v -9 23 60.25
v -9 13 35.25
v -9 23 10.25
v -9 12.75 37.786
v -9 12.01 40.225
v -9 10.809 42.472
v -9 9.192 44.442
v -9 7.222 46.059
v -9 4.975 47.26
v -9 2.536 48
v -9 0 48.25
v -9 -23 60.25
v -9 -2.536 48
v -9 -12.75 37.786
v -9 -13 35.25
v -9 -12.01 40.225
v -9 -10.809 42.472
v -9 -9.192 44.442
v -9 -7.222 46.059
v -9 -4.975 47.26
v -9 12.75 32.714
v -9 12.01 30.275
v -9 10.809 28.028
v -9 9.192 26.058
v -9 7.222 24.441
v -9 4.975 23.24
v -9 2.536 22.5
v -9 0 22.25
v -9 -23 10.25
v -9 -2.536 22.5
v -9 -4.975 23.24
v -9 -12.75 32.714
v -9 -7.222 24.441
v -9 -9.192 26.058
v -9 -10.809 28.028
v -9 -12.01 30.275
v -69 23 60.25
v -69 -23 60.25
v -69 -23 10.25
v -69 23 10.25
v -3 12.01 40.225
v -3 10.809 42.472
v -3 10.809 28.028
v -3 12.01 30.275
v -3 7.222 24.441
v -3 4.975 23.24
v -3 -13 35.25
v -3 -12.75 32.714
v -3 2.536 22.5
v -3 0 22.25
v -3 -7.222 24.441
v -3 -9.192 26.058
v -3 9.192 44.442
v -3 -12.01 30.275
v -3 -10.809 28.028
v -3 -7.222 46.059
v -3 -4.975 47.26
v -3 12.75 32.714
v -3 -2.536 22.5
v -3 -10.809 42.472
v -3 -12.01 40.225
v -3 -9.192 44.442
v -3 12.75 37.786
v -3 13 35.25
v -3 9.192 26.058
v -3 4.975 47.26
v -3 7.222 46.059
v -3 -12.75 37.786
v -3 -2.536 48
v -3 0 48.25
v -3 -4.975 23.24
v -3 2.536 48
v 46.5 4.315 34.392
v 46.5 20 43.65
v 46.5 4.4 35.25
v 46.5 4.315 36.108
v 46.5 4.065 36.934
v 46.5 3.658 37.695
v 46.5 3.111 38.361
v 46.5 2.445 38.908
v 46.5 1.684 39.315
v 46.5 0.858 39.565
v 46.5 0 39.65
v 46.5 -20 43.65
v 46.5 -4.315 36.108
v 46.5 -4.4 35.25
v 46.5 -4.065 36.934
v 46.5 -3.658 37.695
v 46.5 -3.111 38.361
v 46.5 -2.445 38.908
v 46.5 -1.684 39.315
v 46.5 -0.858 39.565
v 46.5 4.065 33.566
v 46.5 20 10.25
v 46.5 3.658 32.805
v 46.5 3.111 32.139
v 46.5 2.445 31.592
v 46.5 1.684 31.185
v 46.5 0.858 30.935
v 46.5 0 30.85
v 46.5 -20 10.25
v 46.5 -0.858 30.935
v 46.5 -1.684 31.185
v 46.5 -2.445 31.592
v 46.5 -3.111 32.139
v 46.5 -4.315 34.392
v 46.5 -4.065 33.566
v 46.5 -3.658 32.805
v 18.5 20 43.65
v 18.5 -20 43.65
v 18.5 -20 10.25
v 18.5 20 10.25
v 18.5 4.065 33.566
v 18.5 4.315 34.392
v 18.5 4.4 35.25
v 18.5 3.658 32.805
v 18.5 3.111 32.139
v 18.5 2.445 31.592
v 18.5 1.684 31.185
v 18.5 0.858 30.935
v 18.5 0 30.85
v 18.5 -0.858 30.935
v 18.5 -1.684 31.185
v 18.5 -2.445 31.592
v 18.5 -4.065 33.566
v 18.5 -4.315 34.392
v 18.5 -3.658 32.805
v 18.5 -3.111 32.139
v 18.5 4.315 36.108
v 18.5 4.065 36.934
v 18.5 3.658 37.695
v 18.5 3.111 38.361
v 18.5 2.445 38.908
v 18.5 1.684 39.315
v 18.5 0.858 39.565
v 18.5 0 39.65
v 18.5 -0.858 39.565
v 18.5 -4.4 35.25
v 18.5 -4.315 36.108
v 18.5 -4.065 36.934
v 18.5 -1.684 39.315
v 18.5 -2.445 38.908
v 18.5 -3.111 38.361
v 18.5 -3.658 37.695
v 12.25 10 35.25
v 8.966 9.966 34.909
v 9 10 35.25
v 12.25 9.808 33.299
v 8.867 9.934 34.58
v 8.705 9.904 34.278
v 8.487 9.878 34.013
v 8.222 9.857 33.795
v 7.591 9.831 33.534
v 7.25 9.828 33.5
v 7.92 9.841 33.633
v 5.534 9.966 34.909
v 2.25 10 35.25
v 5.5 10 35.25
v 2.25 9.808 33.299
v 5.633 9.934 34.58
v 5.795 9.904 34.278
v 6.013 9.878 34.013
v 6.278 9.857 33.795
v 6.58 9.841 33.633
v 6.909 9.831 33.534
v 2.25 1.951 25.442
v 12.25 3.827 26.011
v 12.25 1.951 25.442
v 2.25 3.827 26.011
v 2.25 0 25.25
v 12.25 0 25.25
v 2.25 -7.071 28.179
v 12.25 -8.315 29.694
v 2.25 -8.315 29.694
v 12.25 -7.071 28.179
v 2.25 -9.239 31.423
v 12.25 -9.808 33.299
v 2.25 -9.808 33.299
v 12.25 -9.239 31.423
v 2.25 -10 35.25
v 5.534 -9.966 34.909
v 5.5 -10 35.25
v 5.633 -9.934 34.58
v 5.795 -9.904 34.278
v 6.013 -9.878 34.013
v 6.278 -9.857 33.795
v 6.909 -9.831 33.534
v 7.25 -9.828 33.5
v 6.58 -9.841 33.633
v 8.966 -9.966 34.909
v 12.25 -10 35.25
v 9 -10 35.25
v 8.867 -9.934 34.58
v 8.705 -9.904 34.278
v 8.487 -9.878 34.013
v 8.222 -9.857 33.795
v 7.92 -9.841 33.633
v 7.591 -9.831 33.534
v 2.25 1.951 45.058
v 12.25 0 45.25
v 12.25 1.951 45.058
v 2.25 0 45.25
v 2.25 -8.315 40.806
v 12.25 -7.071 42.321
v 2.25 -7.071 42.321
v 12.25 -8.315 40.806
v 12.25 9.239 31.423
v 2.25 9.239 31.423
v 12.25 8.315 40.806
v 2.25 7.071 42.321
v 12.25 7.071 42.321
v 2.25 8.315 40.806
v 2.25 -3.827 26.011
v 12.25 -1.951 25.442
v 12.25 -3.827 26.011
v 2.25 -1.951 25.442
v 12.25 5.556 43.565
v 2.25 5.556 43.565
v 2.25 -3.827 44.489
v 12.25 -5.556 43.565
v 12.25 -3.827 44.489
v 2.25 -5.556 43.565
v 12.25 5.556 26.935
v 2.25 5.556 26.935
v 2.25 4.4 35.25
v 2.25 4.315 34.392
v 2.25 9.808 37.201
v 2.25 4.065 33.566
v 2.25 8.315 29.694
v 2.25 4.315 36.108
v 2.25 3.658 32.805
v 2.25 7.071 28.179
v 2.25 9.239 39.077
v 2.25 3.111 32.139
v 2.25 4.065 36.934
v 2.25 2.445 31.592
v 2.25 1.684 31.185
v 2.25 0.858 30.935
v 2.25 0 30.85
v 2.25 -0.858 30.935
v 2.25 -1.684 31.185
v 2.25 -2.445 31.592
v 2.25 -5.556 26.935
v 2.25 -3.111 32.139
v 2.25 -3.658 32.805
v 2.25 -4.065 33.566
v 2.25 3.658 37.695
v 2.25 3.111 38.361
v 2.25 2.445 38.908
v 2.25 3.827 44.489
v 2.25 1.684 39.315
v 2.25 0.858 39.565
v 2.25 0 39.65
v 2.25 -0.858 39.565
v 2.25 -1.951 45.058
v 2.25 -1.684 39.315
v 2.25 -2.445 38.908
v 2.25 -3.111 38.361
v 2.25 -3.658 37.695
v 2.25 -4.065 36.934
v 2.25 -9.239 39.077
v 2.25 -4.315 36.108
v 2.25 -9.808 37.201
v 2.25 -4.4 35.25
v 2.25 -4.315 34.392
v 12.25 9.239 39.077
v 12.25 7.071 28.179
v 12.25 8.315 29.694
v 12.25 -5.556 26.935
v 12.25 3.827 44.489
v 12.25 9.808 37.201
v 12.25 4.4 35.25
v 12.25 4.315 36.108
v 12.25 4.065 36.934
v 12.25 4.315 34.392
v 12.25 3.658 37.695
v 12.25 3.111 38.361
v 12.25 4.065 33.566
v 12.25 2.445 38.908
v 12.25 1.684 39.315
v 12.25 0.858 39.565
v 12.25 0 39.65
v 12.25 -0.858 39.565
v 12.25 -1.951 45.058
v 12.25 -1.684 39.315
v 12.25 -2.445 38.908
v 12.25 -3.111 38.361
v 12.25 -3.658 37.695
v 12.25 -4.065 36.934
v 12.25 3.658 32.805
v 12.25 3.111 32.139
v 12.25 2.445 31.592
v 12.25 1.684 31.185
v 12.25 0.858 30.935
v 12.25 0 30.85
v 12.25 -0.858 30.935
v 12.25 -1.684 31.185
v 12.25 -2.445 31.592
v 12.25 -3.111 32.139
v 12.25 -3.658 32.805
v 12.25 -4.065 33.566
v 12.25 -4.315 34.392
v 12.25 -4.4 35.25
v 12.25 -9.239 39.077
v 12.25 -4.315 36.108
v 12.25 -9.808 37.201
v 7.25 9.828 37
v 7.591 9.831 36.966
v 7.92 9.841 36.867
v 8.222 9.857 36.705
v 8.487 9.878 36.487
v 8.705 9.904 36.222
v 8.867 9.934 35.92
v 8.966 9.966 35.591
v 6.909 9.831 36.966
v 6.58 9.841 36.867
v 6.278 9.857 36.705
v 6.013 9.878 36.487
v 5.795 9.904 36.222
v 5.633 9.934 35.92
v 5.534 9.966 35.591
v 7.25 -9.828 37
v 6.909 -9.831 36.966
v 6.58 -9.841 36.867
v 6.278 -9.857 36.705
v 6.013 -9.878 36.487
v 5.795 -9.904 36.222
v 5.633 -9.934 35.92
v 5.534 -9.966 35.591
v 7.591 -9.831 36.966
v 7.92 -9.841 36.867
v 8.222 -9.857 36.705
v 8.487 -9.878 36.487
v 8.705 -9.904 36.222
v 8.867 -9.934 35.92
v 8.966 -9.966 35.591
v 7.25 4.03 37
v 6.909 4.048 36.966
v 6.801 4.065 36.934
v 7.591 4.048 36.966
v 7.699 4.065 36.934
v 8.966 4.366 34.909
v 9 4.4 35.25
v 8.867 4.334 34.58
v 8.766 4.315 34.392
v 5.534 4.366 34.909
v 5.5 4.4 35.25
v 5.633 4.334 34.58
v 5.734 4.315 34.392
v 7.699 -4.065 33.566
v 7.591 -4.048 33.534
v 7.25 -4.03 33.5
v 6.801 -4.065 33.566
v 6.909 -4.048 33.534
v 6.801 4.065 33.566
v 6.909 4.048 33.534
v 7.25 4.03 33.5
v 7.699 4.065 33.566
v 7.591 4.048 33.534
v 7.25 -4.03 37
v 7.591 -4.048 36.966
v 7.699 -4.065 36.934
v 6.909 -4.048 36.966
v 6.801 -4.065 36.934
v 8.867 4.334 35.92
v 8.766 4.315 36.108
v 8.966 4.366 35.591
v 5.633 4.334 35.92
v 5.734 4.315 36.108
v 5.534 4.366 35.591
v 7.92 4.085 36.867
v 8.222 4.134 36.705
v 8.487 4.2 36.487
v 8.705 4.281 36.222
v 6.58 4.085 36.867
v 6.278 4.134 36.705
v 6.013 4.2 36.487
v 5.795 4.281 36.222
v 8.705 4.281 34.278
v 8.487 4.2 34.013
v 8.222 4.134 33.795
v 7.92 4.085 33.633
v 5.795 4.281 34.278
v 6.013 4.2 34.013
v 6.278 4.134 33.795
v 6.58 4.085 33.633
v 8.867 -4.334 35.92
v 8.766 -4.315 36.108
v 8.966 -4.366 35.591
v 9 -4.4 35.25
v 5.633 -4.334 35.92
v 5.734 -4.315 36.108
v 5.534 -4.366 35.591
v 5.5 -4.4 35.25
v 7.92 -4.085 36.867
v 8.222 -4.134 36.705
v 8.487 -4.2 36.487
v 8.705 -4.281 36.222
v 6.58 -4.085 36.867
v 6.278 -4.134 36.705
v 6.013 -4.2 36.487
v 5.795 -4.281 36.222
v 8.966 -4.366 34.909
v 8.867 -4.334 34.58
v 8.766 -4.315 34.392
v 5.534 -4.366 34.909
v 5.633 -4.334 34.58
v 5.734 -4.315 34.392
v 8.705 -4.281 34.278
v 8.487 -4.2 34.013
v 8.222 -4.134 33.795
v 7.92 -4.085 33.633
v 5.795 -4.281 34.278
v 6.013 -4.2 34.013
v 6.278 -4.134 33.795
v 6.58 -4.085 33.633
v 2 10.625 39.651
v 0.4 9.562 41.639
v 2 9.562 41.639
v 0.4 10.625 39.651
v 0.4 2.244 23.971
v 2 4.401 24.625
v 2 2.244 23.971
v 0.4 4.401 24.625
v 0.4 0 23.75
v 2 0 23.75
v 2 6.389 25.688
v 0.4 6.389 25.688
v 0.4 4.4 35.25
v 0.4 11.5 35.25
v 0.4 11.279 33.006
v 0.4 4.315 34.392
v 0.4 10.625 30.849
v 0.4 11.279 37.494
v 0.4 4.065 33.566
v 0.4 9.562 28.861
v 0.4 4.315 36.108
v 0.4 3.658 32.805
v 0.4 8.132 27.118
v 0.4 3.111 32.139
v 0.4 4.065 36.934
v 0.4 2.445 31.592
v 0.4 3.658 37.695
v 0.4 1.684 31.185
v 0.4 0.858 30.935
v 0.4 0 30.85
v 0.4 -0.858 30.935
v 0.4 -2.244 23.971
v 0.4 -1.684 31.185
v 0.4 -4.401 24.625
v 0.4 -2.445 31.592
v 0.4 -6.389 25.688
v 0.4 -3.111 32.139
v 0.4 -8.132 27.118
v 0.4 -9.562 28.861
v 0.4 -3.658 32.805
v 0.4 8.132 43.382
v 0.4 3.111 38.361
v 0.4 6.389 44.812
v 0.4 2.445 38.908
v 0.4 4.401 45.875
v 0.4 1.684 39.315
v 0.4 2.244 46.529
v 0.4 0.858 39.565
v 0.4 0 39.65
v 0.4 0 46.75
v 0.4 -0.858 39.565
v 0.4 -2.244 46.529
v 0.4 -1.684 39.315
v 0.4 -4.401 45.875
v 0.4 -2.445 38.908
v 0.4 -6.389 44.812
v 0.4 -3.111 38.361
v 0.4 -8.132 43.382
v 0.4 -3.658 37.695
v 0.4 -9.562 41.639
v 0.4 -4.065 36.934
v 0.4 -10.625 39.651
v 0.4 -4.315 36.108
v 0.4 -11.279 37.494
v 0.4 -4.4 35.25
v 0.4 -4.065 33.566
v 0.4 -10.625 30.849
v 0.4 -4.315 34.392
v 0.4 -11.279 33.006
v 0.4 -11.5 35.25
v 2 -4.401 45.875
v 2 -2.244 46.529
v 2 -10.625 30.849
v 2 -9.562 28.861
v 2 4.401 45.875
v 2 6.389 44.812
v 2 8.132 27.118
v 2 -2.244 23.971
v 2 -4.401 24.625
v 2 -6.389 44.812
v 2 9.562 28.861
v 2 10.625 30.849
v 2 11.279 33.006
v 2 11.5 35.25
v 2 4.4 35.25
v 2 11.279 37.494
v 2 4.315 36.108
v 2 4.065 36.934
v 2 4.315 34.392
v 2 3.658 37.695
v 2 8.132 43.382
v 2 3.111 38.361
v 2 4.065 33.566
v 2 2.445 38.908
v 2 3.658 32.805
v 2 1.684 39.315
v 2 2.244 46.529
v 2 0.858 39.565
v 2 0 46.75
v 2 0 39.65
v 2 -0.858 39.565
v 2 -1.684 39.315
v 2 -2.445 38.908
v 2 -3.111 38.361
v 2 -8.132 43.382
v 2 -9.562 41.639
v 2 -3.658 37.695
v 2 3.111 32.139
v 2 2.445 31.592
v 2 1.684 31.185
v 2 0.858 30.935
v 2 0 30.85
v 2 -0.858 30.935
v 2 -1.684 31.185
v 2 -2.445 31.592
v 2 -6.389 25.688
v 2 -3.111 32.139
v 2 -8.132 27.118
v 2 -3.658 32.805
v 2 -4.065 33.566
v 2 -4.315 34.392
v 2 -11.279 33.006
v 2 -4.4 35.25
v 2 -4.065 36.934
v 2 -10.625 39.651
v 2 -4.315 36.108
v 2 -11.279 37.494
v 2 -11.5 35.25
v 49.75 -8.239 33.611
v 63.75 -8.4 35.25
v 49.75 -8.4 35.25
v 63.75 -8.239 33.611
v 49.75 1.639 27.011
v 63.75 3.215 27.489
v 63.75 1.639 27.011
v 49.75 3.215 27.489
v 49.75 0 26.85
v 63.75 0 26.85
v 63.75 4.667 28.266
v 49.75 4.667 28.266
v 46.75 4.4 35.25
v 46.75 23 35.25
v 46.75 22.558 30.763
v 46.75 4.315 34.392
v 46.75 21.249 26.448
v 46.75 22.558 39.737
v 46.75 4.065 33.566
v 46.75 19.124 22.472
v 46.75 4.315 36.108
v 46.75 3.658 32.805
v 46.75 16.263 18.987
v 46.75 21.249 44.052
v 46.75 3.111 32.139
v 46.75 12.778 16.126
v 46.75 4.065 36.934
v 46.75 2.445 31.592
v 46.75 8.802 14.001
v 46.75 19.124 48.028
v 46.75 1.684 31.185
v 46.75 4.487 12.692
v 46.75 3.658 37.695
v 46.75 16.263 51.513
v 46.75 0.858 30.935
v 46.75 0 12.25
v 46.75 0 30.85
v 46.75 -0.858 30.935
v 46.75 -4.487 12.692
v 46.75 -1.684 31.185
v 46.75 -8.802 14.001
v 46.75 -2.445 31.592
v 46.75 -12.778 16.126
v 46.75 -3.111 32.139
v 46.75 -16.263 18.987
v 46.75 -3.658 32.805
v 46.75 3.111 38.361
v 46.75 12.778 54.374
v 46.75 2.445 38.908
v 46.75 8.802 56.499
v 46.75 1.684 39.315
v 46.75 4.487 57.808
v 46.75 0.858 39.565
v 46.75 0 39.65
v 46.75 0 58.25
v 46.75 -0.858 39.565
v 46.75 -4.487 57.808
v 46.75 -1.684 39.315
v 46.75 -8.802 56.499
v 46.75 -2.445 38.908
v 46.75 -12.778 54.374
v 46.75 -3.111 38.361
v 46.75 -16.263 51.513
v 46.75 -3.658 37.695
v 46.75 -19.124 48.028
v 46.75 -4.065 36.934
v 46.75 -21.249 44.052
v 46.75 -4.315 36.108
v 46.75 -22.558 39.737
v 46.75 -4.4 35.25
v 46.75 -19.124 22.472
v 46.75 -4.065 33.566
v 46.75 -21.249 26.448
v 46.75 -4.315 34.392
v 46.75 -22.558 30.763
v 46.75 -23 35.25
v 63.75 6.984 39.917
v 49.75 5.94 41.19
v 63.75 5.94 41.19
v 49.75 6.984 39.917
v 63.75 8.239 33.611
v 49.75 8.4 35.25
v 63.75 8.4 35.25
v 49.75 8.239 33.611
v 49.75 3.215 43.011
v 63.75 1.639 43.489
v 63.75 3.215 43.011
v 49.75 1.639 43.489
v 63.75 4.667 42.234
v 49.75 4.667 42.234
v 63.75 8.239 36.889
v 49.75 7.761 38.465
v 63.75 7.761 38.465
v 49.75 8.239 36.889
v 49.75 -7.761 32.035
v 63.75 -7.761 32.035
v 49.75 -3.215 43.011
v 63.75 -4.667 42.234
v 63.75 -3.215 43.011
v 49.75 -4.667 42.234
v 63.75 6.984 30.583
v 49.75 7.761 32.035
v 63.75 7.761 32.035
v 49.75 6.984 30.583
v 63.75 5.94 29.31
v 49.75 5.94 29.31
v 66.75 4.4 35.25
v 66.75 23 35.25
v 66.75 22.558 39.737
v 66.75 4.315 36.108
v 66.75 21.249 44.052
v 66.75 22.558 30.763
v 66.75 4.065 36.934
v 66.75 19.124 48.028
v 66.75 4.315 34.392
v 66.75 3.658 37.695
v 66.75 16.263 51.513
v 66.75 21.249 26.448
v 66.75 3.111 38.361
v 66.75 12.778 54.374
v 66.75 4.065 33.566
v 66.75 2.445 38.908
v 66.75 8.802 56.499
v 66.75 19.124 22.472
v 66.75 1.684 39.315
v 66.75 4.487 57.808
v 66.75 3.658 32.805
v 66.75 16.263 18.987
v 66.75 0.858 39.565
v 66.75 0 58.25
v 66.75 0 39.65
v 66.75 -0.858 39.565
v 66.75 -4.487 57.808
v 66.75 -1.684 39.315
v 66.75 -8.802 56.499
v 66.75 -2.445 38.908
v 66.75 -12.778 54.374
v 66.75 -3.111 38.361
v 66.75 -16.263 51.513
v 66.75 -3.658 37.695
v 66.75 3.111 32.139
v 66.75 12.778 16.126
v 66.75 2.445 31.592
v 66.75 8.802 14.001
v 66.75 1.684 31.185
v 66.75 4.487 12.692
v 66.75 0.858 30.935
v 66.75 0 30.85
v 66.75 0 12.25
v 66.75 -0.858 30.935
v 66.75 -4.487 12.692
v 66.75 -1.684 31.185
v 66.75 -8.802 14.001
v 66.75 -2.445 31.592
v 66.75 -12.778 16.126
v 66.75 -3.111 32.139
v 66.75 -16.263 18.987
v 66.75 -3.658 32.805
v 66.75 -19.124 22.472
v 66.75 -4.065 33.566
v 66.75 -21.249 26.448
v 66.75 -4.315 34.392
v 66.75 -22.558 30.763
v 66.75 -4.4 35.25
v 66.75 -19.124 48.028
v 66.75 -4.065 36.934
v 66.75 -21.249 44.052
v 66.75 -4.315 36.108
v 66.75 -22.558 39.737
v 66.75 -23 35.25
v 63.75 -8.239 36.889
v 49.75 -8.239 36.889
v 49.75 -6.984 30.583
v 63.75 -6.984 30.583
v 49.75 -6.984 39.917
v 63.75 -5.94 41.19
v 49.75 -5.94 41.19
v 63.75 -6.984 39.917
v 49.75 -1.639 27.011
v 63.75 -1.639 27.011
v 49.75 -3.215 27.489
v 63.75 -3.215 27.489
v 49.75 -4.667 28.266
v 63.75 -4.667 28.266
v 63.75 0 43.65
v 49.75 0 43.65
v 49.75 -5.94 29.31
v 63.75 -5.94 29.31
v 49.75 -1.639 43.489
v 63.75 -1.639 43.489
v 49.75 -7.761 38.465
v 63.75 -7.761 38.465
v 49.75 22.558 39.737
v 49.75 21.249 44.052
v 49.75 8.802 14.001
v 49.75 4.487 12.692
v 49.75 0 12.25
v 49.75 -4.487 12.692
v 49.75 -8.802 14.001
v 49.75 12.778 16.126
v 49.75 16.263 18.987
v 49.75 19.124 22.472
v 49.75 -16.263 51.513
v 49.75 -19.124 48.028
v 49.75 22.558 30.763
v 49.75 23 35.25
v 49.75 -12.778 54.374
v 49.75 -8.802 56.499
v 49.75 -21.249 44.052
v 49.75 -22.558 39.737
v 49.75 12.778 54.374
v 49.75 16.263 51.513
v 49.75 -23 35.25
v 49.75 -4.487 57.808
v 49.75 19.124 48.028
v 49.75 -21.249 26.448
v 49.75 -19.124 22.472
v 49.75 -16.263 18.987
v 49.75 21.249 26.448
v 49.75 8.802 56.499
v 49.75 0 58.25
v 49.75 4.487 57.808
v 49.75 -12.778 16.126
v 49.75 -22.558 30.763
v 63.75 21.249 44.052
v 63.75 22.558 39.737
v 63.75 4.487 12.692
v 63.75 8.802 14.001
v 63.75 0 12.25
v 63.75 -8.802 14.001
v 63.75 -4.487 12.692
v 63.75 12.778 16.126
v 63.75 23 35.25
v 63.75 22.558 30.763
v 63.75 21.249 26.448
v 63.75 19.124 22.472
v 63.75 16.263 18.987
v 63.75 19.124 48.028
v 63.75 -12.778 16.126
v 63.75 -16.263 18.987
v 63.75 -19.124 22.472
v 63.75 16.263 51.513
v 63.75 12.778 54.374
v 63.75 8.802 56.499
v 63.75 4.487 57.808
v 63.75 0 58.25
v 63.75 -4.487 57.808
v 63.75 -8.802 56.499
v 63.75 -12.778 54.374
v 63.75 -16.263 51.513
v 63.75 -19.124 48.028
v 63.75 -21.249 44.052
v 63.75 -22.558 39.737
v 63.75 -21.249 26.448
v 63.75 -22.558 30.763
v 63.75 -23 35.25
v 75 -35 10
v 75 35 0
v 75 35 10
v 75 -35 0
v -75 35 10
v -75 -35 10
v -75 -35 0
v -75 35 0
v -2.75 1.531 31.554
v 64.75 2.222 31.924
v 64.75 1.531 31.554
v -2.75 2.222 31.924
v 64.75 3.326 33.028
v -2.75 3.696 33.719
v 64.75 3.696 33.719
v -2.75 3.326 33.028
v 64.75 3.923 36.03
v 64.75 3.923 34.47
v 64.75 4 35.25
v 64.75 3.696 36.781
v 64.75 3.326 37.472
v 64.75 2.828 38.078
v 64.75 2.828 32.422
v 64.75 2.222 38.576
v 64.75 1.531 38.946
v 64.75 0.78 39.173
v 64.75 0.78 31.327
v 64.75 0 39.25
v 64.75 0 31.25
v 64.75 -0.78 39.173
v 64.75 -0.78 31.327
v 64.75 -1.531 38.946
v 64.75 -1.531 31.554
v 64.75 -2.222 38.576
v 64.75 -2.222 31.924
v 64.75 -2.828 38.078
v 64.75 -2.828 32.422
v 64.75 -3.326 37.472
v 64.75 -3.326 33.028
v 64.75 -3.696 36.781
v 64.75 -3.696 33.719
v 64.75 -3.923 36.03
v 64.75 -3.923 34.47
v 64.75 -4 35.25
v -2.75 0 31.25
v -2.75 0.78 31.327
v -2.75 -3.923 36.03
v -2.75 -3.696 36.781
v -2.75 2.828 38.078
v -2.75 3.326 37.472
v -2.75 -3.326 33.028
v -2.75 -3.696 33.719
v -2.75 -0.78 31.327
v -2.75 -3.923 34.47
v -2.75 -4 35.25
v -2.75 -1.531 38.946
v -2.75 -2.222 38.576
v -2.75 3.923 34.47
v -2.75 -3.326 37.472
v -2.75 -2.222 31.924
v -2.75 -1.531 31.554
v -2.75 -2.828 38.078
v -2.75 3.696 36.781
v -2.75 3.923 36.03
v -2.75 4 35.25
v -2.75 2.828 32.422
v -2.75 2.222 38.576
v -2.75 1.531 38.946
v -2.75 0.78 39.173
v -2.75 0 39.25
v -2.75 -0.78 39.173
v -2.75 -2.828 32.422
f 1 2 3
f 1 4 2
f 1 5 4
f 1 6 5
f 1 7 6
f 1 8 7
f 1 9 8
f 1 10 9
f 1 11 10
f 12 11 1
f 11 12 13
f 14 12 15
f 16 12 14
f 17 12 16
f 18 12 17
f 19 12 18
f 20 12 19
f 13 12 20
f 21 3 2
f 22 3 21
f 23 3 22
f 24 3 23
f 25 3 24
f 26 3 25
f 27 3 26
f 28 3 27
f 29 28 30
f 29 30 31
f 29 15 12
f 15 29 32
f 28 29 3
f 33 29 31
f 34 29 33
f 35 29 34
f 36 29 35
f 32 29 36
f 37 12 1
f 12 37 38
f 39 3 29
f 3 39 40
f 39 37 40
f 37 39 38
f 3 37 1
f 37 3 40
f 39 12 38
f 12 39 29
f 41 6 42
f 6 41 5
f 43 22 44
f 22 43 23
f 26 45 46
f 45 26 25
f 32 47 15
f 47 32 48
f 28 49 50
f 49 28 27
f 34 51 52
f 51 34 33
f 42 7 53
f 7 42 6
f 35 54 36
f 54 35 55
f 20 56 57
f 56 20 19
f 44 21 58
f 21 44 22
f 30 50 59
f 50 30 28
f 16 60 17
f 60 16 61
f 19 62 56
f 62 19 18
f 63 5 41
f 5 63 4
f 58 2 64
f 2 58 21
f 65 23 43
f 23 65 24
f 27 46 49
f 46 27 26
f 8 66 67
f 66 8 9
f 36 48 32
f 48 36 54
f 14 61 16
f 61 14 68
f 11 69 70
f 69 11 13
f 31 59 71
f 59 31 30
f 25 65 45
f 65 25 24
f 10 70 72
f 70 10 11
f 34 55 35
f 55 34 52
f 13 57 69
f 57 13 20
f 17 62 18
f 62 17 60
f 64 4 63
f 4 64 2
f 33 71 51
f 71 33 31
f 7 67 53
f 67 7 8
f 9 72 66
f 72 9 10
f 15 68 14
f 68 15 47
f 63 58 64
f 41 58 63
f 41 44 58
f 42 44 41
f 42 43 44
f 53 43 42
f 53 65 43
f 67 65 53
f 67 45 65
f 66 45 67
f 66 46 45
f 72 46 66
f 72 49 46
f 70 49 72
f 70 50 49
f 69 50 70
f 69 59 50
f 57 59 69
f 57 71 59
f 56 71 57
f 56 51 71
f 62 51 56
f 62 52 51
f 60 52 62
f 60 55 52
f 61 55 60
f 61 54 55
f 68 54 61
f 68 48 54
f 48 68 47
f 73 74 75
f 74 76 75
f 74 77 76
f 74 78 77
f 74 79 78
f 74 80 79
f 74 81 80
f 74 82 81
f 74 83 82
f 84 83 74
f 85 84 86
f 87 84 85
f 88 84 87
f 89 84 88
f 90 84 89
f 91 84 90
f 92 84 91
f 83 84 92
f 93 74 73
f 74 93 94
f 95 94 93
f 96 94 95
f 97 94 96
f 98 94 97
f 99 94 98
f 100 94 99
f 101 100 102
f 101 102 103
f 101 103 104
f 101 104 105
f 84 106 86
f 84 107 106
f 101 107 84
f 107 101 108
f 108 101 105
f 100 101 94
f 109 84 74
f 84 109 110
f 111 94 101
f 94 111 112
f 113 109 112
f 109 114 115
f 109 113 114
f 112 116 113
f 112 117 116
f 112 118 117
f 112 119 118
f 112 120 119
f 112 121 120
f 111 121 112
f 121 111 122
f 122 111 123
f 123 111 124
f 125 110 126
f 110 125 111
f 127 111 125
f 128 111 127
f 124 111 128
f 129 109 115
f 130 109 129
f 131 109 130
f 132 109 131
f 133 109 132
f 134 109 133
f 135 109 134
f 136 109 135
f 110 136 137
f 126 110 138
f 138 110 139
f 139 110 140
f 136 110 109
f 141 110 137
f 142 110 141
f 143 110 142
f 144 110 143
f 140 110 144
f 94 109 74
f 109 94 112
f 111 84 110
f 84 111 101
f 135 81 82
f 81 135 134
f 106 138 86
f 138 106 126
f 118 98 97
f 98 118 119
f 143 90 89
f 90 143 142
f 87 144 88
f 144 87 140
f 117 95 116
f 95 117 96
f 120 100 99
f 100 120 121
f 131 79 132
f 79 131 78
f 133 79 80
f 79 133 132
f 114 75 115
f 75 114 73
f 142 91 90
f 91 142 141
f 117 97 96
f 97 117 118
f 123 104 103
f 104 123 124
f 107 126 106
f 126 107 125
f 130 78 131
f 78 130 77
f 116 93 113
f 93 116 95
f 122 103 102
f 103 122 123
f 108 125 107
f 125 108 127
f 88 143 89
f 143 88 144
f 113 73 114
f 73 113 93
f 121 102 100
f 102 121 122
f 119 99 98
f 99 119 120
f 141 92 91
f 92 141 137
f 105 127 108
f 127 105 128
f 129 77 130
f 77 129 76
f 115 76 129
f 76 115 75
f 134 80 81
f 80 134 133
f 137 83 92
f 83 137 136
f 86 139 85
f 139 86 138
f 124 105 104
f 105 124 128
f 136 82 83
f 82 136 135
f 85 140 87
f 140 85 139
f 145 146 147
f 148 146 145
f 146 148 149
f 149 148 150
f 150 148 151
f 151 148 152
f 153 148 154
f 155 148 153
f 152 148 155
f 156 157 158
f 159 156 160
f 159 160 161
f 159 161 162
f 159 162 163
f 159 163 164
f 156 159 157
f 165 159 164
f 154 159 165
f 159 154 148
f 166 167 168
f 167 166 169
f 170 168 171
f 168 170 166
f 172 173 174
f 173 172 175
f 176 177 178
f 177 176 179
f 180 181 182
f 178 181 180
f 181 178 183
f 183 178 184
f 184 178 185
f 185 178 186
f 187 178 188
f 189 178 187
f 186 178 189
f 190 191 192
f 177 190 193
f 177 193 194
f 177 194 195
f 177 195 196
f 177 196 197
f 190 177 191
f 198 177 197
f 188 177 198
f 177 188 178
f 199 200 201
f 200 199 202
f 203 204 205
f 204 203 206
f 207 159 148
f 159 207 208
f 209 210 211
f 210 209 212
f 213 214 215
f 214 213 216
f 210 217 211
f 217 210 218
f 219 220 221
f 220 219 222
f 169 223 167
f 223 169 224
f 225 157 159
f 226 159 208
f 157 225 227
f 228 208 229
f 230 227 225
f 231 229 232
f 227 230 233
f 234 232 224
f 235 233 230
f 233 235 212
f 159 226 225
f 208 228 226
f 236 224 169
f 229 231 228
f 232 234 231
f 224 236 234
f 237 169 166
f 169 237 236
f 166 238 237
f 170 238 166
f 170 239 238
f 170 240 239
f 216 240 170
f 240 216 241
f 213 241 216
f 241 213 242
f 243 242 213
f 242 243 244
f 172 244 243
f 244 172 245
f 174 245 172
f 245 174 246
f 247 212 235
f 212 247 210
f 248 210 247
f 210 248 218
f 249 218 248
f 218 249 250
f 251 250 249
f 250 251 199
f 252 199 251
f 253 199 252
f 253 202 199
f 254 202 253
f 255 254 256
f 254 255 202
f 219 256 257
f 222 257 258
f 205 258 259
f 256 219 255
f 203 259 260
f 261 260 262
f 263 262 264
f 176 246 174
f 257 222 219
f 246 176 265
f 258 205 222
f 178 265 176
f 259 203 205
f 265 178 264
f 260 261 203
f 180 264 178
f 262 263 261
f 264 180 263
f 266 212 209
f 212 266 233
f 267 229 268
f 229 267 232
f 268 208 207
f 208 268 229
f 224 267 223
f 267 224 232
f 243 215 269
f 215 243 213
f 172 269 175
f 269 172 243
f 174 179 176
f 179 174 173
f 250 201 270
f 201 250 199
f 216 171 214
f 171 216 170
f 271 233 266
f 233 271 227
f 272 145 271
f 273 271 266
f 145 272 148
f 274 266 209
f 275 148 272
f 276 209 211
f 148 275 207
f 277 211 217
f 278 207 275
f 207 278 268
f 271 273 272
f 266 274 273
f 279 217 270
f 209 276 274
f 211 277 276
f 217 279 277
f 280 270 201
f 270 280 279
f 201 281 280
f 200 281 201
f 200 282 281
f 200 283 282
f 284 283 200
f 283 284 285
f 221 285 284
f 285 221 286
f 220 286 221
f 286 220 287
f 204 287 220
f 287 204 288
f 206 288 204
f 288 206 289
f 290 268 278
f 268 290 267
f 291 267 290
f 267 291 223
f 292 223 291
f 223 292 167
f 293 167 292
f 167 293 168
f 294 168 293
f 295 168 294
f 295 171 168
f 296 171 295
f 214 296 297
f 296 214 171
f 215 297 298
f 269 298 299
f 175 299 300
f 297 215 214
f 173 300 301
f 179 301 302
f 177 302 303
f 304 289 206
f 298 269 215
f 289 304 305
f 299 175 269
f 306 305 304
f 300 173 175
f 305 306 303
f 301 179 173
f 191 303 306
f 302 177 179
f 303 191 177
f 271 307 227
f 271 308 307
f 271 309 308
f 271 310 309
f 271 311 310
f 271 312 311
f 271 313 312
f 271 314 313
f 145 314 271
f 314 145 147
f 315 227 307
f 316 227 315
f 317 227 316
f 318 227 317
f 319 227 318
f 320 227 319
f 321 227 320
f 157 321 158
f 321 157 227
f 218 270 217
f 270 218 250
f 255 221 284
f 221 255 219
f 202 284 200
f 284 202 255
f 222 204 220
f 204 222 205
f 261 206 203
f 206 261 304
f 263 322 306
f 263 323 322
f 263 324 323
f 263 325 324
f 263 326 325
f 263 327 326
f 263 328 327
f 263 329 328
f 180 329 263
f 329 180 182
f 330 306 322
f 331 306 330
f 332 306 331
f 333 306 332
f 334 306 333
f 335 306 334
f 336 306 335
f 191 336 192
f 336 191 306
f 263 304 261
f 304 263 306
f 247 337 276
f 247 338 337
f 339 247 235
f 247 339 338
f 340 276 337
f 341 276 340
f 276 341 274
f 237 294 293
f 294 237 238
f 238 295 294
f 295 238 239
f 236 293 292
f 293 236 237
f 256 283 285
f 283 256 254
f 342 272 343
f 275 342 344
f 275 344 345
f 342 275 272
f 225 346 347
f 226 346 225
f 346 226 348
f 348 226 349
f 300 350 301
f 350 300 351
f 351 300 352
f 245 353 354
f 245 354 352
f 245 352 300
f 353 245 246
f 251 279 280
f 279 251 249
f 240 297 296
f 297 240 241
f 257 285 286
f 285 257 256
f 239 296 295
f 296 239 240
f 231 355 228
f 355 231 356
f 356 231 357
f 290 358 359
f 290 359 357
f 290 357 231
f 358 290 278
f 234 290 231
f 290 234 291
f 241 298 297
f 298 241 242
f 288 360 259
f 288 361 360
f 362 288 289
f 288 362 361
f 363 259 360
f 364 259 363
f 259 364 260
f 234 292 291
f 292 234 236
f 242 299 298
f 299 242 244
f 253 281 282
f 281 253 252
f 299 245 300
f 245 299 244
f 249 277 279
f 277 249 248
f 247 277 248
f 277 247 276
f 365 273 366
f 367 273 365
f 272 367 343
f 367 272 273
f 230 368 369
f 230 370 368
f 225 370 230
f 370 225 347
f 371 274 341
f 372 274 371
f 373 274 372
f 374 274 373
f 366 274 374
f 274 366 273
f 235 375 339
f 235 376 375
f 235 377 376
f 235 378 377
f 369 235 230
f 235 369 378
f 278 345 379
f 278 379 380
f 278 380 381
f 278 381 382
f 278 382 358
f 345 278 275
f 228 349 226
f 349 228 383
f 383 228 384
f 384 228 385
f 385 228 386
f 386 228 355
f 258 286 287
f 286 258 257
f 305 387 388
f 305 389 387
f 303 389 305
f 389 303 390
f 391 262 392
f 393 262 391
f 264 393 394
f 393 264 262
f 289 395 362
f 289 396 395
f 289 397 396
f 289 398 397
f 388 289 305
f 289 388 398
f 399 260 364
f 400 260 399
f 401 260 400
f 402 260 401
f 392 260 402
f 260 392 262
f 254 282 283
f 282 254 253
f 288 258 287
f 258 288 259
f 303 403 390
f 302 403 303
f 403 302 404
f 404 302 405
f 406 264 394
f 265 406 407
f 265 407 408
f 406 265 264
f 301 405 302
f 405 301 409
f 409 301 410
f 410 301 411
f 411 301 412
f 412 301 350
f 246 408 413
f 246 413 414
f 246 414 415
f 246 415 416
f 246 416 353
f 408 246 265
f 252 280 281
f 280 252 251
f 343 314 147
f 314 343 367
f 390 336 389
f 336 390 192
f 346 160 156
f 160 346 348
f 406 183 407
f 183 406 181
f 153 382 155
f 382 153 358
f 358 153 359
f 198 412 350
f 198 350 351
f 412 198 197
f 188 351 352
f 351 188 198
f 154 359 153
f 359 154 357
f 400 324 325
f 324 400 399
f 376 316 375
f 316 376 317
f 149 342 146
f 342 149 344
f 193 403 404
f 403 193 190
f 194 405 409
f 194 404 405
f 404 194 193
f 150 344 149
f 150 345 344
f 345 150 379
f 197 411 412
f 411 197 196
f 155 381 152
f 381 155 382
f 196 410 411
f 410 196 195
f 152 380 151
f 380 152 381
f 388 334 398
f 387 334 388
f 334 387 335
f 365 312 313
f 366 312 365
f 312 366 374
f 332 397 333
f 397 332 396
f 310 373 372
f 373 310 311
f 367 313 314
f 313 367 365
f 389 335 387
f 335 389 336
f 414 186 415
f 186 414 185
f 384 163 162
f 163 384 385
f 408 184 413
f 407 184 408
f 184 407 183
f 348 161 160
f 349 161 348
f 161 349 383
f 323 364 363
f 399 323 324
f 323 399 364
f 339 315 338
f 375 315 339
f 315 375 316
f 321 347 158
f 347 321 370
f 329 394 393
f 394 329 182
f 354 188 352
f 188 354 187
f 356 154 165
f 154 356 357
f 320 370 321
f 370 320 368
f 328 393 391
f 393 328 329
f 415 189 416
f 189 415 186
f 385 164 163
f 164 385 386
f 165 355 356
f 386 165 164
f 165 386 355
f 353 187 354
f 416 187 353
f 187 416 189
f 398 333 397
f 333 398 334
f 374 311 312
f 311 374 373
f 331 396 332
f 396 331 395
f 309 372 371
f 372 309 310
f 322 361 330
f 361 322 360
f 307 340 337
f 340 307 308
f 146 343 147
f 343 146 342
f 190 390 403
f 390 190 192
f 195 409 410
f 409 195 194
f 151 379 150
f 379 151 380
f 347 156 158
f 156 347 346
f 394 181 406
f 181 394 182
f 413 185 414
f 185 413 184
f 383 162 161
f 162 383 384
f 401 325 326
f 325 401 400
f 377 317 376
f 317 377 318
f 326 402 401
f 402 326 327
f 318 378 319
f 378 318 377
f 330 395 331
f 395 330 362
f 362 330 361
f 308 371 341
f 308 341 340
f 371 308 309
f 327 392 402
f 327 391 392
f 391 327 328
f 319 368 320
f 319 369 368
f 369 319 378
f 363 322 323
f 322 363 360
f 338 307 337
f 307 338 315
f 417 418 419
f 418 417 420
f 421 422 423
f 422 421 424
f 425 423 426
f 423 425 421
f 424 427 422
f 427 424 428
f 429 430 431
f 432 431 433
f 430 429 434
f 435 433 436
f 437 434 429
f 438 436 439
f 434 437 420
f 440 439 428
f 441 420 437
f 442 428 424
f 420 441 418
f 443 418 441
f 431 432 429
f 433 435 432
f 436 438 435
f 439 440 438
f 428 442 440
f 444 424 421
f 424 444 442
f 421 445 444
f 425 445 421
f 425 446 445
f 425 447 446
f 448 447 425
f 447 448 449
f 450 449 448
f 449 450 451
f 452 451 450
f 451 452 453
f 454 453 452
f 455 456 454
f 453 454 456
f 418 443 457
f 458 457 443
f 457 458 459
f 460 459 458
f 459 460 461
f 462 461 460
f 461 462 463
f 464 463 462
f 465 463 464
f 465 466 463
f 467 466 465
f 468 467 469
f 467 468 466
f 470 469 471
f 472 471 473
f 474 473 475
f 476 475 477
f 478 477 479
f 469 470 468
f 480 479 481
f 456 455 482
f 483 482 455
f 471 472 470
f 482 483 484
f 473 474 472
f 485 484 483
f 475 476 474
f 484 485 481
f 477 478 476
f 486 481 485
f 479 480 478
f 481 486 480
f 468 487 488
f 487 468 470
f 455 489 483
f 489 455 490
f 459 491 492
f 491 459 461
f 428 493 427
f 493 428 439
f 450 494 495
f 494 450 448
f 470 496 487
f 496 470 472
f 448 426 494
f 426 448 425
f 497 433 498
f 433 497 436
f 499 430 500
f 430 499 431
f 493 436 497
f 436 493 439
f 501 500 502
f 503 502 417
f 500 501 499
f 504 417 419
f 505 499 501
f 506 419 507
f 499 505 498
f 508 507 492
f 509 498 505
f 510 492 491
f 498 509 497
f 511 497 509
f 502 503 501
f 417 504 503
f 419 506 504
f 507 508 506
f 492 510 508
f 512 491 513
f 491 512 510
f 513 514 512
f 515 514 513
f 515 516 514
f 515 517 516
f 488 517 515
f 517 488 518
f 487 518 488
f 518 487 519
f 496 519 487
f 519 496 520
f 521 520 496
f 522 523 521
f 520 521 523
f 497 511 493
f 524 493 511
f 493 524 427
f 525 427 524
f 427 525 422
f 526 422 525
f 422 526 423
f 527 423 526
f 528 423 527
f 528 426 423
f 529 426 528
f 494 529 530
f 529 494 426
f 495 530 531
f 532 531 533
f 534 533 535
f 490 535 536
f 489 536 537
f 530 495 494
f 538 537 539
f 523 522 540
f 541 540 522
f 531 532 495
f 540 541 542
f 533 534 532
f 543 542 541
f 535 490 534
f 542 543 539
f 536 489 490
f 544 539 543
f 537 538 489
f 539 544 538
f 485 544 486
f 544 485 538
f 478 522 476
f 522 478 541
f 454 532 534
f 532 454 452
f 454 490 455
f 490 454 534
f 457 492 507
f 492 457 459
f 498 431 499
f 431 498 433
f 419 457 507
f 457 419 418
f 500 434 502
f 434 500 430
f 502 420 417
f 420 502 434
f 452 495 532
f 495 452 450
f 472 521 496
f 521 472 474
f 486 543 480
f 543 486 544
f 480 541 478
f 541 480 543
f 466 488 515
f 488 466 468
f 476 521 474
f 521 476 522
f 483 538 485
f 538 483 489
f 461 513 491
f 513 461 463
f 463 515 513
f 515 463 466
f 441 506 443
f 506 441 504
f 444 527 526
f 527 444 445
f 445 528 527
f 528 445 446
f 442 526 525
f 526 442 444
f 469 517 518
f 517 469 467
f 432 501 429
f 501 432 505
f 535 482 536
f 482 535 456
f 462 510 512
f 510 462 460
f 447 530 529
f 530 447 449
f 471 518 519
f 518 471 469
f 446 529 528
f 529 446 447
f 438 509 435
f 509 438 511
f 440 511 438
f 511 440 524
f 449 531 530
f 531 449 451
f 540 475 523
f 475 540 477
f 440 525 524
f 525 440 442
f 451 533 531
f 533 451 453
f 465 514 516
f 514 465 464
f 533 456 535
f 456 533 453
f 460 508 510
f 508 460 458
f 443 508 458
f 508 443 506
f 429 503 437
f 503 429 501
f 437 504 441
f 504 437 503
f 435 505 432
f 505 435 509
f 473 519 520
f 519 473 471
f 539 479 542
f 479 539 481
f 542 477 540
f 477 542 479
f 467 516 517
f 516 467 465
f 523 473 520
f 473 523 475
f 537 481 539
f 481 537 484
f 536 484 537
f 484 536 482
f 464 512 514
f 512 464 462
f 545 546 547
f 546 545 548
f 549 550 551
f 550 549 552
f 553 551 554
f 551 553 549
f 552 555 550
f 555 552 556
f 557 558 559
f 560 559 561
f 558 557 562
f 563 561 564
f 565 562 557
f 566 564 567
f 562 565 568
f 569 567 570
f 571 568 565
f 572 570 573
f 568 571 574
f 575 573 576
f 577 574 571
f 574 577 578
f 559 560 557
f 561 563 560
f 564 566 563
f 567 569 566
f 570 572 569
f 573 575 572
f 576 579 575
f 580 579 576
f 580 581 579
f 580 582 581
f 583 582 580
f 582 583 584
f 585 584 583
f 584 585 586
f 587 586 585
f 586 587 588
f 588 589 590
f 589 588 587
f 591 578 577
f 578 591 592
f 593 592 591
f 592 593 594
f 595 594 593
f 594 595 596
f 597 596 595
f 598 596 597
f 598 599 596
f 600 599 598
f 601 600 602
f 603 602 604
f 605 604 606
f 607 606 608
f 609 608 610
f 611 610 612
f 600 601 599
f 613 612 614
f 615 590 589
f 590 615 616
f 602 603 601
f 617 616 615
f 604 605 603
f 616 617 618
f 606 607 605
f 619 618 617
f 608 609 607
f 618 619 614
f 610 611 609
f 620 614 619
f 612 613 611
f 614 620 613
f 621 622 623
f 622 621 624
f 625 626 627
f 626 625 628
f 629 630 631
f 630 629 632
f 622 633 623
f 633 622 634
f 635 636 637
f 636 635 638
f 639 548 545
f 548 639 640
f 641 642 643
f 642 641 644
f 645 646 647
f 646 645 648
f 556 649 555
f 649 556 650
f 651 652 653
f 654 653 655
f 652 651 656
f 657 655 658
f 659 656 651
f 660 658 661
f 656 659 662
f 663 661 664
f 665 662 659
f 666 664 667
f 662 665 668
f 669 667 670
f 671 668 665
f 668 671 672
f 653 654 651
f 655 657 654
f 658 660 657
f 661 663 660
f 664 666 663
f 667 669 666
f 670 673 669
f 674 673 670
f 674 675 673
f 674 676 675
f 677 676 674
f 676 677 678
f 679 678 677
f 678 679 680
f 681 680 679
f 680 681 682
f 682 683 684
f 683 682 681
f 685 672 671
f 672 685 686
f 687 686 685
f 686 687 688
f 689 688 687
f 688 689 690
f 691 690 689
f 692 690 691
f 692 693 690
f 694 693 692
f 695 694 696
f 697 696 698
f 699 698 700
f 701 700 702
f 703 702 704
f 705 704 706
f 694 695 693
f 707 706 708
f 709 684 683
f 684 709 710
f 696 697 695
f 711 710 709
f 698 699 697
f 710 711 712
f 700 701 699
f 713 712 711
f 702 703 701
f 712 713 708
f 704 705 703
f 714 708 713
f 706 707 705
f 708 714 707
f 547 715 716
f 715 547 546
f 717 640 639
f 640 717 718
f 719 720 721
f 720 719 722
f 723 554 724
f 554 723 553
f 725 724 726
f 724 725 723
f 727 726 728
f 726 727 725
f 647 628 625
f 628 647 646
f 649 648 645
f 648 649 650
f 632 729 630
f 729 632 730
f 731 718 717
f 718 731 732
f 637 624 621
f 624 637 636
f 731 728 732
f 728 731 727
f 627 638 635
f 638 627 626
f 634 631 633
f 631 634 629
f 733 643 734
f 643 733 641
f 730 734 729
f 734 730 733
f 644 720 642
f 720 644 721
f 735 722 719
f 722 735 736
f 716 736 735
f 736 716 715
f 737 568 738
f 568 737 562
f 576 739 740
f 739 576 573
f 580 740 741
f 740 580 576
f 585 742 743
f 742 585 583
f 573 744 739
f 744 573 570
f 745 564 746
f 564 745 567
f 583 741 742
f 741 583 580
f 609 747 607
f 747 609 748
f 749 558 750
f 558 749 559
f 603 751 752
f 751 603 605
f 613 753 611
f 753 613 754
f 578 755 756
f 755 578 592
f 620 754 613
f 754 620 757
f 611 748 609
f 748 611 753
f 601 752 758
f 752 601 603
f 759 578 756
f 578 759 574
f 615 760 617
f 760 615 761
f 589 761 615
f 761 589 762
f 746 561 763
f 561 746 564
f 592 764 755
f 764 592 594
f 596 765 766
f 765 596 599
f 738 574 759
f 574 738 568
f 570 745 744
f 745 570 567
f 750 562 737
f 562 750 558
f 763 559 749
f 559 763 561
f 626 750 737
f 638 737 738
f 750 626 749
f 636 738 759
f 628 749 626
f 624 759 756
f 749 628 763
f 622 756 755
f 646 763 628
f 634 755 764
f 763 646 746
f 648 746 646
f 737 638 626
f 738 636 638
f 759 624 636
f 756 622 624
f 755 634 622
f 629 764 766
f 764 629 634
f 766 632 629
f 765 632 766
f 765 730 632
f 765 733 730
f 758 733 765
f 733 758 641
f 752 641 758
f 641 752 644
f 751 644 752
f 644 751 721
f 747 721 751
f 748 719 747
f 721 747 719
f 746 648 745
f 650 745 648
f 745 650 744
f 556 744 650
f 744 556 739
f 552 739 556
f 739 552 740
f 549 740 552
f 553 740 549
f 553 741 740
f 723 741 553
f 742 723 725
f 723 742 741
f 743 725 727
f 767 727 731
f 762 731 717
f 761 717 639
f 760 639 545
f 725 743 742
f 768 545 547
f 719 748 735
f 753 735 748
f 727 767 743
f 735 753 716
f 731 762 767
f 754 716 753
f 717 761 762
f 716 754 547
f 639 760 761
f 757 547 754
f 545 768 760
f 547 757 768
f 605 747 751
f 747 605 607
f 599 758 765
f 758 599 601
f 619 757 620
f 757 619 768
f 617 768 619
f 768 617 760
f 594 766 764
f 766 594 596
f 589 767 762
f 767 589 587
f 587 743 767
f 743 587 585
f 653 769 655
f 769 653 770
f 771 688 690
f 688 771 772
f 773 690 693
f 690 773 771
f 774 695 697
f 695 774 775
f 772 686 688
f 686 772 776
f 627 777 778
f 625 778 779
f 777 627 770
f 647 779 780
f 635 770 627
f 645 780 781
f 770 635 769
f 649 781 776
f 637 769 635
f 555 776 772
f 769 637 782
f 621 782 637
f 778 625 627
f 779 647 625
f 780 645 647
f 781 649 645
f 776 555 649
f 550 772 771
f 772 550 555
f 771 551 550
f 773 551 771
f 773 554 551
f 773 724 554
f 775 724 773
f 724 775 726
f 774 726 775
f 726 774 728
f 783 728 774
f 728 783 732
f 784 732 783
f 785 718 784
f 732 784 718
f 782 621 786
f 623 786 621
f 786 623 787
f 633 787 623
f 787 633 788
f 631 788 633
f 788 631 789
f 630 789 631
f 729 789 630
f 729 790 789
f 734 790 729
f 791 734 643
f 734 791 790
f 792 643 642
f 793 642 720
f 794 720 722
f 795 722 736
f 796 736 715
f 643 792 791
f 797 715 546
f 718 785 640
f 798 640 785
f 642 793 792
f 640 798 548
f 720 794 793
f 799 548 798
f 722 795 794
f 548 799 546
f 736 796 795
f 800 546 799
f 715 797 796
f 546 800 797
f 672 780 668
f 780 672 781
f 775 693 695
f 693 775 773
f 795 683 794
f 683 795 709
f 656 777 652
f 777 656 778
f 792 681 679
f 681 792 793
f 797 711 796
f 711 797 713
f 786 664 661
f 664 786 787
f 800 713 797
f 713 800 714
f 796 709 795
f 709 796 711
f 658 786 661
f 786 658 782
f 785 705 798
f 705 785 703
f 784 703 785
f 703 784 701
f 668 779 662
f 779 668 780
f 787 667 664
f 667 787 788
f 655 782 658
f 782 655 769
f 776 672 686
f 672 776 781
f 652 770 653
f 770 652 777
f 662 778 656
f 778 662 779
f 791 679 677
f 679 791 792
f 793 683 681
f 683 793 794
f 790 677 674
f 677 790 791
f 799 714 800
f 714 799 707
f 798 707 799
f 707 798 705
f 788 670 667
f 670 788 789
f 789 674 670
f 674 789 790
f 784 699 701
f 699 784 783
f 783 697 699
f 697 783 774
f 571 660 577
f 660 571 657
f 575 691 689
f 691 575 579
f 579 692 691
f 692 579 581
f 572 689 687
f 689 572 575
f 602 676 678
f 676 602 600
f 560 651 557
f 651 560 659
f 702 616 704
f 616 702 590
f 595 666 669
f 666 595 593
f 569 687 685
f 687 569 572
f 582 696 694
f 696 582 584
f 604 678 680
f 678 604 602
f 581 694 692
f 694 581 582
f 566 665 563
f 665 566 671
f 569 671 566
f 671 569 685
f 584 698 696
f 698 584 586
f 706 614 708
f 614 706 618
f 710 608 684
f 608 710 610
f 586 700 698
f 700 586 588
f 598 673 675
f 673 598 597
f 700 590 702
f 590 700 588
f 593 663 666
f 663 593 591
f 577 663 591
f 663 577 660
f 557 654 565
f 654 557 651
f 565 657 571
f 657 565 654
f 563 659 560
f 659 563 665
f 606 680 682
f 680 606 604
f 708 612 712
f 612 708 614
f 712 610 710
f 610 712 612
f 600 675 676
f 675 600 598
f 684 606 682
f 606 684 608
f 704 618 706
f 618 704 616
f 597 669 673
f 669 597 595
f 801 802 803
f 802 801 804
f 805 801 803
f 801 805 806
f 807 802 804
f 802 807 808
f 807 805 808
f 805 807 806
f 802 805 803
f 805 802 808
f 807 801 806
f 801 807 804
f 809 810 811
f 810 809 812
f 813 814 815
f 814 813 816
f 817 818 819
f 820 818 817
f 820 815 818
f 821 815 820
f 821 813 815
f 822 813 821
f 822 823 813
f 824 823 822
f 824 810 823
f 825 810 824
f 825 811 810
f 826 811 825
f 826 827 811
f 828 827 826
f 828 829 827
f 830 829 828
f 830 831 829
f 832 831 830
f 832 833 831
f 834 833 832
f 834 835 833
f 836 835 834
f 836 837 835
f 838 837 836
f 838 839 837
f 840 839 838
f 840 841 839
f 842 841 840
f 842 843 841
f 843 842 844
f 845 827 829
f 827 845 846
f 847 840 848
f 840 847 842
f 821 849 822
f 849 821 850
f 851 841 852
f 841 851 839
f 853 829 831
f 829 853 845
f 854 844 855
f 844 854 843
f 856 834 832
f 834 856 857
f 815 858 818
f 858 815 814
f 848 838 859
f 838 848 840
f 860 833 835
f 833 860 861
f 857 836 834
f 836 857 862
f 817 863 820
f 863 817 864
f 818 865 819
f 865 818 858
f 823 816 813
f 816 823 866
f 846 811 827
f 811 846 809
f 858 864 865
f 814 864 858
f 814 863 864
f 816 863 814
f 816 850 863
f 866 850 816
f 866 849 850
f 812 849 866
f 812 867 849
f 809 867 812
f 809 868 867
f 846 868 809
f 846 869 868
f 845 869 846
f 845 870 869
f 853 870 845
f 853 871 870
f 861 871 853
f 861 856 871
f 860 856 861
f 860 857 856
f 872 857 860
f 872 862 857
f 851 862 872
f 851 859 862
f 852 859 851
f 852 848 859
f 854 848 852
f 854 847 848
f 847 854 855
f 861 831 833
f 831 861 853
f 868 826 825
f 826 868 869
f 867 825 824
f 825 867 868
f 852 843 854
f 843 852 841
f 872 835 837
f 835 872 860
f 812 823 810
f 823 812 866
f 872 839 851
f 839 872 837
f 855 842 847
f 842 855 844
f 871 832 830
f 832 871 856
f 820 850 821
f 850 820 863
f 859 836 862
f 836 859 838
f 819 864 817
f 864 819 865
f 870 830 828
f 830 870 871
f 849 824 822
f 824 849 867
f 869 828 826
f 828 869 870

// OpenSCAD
$fn = 32;

// ------------------------------------------------------------------------
// Motor drive station: motor 60 x 50 mm, shaft d8, pulley d46
// Every part is its own module, assembly() places every instance.
// ------------------------------------------------------------------------

// --- part 1 ---
module station_bed() {
  difference() {
    translate([-75, -35, 0]) cube([150, 70, 10]);
  }
}

// --- part 2 ---
module drive_motor() {
  union() {
    translate([-30, -23, 0]) cube([60, 46, 50]);
    translate([33, 0, 25]) rotate([0, 90, 0]) cylinder(h = 6, d = 26, center = true);
  }
}

// --- part 3 ---
module pillow_block() {
  difference() {
    translate([-14, -20, 0]) cube([28, 40, 33.4]);
    translate([0, 0, 25]) rotate([0, 90, 0]) cylinder(h = 30, d = 8.8, center = true);
  }
}

// --- part 4 ---
module drive_shaft() {
  translate([0, 0, -33.75]) cylinder(h = 67.5, d = 8);
}

// --- part 5 ---
module shaft_collar() {
  difference() {
    cylinder(h = 10, d = 20);
    translate([0, 0, -1]) cylinder(h = 12, d = 8.8);
    translate([0, 0, 5]) rotate([90, 0, 0]) cylinder(h = 22, d = 3.5, center = true);
  }
}

// --- part 6 ---
module collar_washer() {
  difference() {
      translate([0, 0, 0]) cylinder(h = 1.6, d = 23);
      translate([0, 0, -1]) cylinder(h = 3.6, d = 8.8);
    }
}

// --- part 7 ---
module drive_pulley() {
  difference() {
    union() {
      cylinder(h = 20, d = 16.8);
      cylinder(h = 3, d = 46);
      translate([0, 0, 17]) cylinder(h = 3, d = 46);
    }
    translate([0, 0, -1]) cylinder(h = 22, d = 8.8);
  }
}

// --- assembly ---
module assembly() {
  color([0.80, 0.24, 0.20]) translate([0, 0, 0]) rotate([0, 0, 0]) station_bed();
  color([0.20, 0.45, 0.75]) translate([-39, 0, 10.25]) rotate([0, 0, 0]) drive_motor();
  color([0.25, 0.62, 0.32]) translate([32.5, 0, 10.25]) rotate([0, 0, 0]) pillow_block();
  color([0.92, 0.70, 0.18]) translate([31, 0, 35.25]) rotate([0, 90, 0]) drive_shaft();
  color([0.58, 0.35, 0.70]) translate([2.25, 0, 35.25]) rotate([0, 90, 0]) shaft_collar();
  color([0.16, 0.66, 0.66]) translate([0.4, 0, 35.25]) rotate([0, 90, 0]) collar_washer();
  color([0.85, 0.48, 0.18]) translate([46.75, 0, 35.25]) rotate([0, 90, 0]) drive_pulley();
}

assembly();
